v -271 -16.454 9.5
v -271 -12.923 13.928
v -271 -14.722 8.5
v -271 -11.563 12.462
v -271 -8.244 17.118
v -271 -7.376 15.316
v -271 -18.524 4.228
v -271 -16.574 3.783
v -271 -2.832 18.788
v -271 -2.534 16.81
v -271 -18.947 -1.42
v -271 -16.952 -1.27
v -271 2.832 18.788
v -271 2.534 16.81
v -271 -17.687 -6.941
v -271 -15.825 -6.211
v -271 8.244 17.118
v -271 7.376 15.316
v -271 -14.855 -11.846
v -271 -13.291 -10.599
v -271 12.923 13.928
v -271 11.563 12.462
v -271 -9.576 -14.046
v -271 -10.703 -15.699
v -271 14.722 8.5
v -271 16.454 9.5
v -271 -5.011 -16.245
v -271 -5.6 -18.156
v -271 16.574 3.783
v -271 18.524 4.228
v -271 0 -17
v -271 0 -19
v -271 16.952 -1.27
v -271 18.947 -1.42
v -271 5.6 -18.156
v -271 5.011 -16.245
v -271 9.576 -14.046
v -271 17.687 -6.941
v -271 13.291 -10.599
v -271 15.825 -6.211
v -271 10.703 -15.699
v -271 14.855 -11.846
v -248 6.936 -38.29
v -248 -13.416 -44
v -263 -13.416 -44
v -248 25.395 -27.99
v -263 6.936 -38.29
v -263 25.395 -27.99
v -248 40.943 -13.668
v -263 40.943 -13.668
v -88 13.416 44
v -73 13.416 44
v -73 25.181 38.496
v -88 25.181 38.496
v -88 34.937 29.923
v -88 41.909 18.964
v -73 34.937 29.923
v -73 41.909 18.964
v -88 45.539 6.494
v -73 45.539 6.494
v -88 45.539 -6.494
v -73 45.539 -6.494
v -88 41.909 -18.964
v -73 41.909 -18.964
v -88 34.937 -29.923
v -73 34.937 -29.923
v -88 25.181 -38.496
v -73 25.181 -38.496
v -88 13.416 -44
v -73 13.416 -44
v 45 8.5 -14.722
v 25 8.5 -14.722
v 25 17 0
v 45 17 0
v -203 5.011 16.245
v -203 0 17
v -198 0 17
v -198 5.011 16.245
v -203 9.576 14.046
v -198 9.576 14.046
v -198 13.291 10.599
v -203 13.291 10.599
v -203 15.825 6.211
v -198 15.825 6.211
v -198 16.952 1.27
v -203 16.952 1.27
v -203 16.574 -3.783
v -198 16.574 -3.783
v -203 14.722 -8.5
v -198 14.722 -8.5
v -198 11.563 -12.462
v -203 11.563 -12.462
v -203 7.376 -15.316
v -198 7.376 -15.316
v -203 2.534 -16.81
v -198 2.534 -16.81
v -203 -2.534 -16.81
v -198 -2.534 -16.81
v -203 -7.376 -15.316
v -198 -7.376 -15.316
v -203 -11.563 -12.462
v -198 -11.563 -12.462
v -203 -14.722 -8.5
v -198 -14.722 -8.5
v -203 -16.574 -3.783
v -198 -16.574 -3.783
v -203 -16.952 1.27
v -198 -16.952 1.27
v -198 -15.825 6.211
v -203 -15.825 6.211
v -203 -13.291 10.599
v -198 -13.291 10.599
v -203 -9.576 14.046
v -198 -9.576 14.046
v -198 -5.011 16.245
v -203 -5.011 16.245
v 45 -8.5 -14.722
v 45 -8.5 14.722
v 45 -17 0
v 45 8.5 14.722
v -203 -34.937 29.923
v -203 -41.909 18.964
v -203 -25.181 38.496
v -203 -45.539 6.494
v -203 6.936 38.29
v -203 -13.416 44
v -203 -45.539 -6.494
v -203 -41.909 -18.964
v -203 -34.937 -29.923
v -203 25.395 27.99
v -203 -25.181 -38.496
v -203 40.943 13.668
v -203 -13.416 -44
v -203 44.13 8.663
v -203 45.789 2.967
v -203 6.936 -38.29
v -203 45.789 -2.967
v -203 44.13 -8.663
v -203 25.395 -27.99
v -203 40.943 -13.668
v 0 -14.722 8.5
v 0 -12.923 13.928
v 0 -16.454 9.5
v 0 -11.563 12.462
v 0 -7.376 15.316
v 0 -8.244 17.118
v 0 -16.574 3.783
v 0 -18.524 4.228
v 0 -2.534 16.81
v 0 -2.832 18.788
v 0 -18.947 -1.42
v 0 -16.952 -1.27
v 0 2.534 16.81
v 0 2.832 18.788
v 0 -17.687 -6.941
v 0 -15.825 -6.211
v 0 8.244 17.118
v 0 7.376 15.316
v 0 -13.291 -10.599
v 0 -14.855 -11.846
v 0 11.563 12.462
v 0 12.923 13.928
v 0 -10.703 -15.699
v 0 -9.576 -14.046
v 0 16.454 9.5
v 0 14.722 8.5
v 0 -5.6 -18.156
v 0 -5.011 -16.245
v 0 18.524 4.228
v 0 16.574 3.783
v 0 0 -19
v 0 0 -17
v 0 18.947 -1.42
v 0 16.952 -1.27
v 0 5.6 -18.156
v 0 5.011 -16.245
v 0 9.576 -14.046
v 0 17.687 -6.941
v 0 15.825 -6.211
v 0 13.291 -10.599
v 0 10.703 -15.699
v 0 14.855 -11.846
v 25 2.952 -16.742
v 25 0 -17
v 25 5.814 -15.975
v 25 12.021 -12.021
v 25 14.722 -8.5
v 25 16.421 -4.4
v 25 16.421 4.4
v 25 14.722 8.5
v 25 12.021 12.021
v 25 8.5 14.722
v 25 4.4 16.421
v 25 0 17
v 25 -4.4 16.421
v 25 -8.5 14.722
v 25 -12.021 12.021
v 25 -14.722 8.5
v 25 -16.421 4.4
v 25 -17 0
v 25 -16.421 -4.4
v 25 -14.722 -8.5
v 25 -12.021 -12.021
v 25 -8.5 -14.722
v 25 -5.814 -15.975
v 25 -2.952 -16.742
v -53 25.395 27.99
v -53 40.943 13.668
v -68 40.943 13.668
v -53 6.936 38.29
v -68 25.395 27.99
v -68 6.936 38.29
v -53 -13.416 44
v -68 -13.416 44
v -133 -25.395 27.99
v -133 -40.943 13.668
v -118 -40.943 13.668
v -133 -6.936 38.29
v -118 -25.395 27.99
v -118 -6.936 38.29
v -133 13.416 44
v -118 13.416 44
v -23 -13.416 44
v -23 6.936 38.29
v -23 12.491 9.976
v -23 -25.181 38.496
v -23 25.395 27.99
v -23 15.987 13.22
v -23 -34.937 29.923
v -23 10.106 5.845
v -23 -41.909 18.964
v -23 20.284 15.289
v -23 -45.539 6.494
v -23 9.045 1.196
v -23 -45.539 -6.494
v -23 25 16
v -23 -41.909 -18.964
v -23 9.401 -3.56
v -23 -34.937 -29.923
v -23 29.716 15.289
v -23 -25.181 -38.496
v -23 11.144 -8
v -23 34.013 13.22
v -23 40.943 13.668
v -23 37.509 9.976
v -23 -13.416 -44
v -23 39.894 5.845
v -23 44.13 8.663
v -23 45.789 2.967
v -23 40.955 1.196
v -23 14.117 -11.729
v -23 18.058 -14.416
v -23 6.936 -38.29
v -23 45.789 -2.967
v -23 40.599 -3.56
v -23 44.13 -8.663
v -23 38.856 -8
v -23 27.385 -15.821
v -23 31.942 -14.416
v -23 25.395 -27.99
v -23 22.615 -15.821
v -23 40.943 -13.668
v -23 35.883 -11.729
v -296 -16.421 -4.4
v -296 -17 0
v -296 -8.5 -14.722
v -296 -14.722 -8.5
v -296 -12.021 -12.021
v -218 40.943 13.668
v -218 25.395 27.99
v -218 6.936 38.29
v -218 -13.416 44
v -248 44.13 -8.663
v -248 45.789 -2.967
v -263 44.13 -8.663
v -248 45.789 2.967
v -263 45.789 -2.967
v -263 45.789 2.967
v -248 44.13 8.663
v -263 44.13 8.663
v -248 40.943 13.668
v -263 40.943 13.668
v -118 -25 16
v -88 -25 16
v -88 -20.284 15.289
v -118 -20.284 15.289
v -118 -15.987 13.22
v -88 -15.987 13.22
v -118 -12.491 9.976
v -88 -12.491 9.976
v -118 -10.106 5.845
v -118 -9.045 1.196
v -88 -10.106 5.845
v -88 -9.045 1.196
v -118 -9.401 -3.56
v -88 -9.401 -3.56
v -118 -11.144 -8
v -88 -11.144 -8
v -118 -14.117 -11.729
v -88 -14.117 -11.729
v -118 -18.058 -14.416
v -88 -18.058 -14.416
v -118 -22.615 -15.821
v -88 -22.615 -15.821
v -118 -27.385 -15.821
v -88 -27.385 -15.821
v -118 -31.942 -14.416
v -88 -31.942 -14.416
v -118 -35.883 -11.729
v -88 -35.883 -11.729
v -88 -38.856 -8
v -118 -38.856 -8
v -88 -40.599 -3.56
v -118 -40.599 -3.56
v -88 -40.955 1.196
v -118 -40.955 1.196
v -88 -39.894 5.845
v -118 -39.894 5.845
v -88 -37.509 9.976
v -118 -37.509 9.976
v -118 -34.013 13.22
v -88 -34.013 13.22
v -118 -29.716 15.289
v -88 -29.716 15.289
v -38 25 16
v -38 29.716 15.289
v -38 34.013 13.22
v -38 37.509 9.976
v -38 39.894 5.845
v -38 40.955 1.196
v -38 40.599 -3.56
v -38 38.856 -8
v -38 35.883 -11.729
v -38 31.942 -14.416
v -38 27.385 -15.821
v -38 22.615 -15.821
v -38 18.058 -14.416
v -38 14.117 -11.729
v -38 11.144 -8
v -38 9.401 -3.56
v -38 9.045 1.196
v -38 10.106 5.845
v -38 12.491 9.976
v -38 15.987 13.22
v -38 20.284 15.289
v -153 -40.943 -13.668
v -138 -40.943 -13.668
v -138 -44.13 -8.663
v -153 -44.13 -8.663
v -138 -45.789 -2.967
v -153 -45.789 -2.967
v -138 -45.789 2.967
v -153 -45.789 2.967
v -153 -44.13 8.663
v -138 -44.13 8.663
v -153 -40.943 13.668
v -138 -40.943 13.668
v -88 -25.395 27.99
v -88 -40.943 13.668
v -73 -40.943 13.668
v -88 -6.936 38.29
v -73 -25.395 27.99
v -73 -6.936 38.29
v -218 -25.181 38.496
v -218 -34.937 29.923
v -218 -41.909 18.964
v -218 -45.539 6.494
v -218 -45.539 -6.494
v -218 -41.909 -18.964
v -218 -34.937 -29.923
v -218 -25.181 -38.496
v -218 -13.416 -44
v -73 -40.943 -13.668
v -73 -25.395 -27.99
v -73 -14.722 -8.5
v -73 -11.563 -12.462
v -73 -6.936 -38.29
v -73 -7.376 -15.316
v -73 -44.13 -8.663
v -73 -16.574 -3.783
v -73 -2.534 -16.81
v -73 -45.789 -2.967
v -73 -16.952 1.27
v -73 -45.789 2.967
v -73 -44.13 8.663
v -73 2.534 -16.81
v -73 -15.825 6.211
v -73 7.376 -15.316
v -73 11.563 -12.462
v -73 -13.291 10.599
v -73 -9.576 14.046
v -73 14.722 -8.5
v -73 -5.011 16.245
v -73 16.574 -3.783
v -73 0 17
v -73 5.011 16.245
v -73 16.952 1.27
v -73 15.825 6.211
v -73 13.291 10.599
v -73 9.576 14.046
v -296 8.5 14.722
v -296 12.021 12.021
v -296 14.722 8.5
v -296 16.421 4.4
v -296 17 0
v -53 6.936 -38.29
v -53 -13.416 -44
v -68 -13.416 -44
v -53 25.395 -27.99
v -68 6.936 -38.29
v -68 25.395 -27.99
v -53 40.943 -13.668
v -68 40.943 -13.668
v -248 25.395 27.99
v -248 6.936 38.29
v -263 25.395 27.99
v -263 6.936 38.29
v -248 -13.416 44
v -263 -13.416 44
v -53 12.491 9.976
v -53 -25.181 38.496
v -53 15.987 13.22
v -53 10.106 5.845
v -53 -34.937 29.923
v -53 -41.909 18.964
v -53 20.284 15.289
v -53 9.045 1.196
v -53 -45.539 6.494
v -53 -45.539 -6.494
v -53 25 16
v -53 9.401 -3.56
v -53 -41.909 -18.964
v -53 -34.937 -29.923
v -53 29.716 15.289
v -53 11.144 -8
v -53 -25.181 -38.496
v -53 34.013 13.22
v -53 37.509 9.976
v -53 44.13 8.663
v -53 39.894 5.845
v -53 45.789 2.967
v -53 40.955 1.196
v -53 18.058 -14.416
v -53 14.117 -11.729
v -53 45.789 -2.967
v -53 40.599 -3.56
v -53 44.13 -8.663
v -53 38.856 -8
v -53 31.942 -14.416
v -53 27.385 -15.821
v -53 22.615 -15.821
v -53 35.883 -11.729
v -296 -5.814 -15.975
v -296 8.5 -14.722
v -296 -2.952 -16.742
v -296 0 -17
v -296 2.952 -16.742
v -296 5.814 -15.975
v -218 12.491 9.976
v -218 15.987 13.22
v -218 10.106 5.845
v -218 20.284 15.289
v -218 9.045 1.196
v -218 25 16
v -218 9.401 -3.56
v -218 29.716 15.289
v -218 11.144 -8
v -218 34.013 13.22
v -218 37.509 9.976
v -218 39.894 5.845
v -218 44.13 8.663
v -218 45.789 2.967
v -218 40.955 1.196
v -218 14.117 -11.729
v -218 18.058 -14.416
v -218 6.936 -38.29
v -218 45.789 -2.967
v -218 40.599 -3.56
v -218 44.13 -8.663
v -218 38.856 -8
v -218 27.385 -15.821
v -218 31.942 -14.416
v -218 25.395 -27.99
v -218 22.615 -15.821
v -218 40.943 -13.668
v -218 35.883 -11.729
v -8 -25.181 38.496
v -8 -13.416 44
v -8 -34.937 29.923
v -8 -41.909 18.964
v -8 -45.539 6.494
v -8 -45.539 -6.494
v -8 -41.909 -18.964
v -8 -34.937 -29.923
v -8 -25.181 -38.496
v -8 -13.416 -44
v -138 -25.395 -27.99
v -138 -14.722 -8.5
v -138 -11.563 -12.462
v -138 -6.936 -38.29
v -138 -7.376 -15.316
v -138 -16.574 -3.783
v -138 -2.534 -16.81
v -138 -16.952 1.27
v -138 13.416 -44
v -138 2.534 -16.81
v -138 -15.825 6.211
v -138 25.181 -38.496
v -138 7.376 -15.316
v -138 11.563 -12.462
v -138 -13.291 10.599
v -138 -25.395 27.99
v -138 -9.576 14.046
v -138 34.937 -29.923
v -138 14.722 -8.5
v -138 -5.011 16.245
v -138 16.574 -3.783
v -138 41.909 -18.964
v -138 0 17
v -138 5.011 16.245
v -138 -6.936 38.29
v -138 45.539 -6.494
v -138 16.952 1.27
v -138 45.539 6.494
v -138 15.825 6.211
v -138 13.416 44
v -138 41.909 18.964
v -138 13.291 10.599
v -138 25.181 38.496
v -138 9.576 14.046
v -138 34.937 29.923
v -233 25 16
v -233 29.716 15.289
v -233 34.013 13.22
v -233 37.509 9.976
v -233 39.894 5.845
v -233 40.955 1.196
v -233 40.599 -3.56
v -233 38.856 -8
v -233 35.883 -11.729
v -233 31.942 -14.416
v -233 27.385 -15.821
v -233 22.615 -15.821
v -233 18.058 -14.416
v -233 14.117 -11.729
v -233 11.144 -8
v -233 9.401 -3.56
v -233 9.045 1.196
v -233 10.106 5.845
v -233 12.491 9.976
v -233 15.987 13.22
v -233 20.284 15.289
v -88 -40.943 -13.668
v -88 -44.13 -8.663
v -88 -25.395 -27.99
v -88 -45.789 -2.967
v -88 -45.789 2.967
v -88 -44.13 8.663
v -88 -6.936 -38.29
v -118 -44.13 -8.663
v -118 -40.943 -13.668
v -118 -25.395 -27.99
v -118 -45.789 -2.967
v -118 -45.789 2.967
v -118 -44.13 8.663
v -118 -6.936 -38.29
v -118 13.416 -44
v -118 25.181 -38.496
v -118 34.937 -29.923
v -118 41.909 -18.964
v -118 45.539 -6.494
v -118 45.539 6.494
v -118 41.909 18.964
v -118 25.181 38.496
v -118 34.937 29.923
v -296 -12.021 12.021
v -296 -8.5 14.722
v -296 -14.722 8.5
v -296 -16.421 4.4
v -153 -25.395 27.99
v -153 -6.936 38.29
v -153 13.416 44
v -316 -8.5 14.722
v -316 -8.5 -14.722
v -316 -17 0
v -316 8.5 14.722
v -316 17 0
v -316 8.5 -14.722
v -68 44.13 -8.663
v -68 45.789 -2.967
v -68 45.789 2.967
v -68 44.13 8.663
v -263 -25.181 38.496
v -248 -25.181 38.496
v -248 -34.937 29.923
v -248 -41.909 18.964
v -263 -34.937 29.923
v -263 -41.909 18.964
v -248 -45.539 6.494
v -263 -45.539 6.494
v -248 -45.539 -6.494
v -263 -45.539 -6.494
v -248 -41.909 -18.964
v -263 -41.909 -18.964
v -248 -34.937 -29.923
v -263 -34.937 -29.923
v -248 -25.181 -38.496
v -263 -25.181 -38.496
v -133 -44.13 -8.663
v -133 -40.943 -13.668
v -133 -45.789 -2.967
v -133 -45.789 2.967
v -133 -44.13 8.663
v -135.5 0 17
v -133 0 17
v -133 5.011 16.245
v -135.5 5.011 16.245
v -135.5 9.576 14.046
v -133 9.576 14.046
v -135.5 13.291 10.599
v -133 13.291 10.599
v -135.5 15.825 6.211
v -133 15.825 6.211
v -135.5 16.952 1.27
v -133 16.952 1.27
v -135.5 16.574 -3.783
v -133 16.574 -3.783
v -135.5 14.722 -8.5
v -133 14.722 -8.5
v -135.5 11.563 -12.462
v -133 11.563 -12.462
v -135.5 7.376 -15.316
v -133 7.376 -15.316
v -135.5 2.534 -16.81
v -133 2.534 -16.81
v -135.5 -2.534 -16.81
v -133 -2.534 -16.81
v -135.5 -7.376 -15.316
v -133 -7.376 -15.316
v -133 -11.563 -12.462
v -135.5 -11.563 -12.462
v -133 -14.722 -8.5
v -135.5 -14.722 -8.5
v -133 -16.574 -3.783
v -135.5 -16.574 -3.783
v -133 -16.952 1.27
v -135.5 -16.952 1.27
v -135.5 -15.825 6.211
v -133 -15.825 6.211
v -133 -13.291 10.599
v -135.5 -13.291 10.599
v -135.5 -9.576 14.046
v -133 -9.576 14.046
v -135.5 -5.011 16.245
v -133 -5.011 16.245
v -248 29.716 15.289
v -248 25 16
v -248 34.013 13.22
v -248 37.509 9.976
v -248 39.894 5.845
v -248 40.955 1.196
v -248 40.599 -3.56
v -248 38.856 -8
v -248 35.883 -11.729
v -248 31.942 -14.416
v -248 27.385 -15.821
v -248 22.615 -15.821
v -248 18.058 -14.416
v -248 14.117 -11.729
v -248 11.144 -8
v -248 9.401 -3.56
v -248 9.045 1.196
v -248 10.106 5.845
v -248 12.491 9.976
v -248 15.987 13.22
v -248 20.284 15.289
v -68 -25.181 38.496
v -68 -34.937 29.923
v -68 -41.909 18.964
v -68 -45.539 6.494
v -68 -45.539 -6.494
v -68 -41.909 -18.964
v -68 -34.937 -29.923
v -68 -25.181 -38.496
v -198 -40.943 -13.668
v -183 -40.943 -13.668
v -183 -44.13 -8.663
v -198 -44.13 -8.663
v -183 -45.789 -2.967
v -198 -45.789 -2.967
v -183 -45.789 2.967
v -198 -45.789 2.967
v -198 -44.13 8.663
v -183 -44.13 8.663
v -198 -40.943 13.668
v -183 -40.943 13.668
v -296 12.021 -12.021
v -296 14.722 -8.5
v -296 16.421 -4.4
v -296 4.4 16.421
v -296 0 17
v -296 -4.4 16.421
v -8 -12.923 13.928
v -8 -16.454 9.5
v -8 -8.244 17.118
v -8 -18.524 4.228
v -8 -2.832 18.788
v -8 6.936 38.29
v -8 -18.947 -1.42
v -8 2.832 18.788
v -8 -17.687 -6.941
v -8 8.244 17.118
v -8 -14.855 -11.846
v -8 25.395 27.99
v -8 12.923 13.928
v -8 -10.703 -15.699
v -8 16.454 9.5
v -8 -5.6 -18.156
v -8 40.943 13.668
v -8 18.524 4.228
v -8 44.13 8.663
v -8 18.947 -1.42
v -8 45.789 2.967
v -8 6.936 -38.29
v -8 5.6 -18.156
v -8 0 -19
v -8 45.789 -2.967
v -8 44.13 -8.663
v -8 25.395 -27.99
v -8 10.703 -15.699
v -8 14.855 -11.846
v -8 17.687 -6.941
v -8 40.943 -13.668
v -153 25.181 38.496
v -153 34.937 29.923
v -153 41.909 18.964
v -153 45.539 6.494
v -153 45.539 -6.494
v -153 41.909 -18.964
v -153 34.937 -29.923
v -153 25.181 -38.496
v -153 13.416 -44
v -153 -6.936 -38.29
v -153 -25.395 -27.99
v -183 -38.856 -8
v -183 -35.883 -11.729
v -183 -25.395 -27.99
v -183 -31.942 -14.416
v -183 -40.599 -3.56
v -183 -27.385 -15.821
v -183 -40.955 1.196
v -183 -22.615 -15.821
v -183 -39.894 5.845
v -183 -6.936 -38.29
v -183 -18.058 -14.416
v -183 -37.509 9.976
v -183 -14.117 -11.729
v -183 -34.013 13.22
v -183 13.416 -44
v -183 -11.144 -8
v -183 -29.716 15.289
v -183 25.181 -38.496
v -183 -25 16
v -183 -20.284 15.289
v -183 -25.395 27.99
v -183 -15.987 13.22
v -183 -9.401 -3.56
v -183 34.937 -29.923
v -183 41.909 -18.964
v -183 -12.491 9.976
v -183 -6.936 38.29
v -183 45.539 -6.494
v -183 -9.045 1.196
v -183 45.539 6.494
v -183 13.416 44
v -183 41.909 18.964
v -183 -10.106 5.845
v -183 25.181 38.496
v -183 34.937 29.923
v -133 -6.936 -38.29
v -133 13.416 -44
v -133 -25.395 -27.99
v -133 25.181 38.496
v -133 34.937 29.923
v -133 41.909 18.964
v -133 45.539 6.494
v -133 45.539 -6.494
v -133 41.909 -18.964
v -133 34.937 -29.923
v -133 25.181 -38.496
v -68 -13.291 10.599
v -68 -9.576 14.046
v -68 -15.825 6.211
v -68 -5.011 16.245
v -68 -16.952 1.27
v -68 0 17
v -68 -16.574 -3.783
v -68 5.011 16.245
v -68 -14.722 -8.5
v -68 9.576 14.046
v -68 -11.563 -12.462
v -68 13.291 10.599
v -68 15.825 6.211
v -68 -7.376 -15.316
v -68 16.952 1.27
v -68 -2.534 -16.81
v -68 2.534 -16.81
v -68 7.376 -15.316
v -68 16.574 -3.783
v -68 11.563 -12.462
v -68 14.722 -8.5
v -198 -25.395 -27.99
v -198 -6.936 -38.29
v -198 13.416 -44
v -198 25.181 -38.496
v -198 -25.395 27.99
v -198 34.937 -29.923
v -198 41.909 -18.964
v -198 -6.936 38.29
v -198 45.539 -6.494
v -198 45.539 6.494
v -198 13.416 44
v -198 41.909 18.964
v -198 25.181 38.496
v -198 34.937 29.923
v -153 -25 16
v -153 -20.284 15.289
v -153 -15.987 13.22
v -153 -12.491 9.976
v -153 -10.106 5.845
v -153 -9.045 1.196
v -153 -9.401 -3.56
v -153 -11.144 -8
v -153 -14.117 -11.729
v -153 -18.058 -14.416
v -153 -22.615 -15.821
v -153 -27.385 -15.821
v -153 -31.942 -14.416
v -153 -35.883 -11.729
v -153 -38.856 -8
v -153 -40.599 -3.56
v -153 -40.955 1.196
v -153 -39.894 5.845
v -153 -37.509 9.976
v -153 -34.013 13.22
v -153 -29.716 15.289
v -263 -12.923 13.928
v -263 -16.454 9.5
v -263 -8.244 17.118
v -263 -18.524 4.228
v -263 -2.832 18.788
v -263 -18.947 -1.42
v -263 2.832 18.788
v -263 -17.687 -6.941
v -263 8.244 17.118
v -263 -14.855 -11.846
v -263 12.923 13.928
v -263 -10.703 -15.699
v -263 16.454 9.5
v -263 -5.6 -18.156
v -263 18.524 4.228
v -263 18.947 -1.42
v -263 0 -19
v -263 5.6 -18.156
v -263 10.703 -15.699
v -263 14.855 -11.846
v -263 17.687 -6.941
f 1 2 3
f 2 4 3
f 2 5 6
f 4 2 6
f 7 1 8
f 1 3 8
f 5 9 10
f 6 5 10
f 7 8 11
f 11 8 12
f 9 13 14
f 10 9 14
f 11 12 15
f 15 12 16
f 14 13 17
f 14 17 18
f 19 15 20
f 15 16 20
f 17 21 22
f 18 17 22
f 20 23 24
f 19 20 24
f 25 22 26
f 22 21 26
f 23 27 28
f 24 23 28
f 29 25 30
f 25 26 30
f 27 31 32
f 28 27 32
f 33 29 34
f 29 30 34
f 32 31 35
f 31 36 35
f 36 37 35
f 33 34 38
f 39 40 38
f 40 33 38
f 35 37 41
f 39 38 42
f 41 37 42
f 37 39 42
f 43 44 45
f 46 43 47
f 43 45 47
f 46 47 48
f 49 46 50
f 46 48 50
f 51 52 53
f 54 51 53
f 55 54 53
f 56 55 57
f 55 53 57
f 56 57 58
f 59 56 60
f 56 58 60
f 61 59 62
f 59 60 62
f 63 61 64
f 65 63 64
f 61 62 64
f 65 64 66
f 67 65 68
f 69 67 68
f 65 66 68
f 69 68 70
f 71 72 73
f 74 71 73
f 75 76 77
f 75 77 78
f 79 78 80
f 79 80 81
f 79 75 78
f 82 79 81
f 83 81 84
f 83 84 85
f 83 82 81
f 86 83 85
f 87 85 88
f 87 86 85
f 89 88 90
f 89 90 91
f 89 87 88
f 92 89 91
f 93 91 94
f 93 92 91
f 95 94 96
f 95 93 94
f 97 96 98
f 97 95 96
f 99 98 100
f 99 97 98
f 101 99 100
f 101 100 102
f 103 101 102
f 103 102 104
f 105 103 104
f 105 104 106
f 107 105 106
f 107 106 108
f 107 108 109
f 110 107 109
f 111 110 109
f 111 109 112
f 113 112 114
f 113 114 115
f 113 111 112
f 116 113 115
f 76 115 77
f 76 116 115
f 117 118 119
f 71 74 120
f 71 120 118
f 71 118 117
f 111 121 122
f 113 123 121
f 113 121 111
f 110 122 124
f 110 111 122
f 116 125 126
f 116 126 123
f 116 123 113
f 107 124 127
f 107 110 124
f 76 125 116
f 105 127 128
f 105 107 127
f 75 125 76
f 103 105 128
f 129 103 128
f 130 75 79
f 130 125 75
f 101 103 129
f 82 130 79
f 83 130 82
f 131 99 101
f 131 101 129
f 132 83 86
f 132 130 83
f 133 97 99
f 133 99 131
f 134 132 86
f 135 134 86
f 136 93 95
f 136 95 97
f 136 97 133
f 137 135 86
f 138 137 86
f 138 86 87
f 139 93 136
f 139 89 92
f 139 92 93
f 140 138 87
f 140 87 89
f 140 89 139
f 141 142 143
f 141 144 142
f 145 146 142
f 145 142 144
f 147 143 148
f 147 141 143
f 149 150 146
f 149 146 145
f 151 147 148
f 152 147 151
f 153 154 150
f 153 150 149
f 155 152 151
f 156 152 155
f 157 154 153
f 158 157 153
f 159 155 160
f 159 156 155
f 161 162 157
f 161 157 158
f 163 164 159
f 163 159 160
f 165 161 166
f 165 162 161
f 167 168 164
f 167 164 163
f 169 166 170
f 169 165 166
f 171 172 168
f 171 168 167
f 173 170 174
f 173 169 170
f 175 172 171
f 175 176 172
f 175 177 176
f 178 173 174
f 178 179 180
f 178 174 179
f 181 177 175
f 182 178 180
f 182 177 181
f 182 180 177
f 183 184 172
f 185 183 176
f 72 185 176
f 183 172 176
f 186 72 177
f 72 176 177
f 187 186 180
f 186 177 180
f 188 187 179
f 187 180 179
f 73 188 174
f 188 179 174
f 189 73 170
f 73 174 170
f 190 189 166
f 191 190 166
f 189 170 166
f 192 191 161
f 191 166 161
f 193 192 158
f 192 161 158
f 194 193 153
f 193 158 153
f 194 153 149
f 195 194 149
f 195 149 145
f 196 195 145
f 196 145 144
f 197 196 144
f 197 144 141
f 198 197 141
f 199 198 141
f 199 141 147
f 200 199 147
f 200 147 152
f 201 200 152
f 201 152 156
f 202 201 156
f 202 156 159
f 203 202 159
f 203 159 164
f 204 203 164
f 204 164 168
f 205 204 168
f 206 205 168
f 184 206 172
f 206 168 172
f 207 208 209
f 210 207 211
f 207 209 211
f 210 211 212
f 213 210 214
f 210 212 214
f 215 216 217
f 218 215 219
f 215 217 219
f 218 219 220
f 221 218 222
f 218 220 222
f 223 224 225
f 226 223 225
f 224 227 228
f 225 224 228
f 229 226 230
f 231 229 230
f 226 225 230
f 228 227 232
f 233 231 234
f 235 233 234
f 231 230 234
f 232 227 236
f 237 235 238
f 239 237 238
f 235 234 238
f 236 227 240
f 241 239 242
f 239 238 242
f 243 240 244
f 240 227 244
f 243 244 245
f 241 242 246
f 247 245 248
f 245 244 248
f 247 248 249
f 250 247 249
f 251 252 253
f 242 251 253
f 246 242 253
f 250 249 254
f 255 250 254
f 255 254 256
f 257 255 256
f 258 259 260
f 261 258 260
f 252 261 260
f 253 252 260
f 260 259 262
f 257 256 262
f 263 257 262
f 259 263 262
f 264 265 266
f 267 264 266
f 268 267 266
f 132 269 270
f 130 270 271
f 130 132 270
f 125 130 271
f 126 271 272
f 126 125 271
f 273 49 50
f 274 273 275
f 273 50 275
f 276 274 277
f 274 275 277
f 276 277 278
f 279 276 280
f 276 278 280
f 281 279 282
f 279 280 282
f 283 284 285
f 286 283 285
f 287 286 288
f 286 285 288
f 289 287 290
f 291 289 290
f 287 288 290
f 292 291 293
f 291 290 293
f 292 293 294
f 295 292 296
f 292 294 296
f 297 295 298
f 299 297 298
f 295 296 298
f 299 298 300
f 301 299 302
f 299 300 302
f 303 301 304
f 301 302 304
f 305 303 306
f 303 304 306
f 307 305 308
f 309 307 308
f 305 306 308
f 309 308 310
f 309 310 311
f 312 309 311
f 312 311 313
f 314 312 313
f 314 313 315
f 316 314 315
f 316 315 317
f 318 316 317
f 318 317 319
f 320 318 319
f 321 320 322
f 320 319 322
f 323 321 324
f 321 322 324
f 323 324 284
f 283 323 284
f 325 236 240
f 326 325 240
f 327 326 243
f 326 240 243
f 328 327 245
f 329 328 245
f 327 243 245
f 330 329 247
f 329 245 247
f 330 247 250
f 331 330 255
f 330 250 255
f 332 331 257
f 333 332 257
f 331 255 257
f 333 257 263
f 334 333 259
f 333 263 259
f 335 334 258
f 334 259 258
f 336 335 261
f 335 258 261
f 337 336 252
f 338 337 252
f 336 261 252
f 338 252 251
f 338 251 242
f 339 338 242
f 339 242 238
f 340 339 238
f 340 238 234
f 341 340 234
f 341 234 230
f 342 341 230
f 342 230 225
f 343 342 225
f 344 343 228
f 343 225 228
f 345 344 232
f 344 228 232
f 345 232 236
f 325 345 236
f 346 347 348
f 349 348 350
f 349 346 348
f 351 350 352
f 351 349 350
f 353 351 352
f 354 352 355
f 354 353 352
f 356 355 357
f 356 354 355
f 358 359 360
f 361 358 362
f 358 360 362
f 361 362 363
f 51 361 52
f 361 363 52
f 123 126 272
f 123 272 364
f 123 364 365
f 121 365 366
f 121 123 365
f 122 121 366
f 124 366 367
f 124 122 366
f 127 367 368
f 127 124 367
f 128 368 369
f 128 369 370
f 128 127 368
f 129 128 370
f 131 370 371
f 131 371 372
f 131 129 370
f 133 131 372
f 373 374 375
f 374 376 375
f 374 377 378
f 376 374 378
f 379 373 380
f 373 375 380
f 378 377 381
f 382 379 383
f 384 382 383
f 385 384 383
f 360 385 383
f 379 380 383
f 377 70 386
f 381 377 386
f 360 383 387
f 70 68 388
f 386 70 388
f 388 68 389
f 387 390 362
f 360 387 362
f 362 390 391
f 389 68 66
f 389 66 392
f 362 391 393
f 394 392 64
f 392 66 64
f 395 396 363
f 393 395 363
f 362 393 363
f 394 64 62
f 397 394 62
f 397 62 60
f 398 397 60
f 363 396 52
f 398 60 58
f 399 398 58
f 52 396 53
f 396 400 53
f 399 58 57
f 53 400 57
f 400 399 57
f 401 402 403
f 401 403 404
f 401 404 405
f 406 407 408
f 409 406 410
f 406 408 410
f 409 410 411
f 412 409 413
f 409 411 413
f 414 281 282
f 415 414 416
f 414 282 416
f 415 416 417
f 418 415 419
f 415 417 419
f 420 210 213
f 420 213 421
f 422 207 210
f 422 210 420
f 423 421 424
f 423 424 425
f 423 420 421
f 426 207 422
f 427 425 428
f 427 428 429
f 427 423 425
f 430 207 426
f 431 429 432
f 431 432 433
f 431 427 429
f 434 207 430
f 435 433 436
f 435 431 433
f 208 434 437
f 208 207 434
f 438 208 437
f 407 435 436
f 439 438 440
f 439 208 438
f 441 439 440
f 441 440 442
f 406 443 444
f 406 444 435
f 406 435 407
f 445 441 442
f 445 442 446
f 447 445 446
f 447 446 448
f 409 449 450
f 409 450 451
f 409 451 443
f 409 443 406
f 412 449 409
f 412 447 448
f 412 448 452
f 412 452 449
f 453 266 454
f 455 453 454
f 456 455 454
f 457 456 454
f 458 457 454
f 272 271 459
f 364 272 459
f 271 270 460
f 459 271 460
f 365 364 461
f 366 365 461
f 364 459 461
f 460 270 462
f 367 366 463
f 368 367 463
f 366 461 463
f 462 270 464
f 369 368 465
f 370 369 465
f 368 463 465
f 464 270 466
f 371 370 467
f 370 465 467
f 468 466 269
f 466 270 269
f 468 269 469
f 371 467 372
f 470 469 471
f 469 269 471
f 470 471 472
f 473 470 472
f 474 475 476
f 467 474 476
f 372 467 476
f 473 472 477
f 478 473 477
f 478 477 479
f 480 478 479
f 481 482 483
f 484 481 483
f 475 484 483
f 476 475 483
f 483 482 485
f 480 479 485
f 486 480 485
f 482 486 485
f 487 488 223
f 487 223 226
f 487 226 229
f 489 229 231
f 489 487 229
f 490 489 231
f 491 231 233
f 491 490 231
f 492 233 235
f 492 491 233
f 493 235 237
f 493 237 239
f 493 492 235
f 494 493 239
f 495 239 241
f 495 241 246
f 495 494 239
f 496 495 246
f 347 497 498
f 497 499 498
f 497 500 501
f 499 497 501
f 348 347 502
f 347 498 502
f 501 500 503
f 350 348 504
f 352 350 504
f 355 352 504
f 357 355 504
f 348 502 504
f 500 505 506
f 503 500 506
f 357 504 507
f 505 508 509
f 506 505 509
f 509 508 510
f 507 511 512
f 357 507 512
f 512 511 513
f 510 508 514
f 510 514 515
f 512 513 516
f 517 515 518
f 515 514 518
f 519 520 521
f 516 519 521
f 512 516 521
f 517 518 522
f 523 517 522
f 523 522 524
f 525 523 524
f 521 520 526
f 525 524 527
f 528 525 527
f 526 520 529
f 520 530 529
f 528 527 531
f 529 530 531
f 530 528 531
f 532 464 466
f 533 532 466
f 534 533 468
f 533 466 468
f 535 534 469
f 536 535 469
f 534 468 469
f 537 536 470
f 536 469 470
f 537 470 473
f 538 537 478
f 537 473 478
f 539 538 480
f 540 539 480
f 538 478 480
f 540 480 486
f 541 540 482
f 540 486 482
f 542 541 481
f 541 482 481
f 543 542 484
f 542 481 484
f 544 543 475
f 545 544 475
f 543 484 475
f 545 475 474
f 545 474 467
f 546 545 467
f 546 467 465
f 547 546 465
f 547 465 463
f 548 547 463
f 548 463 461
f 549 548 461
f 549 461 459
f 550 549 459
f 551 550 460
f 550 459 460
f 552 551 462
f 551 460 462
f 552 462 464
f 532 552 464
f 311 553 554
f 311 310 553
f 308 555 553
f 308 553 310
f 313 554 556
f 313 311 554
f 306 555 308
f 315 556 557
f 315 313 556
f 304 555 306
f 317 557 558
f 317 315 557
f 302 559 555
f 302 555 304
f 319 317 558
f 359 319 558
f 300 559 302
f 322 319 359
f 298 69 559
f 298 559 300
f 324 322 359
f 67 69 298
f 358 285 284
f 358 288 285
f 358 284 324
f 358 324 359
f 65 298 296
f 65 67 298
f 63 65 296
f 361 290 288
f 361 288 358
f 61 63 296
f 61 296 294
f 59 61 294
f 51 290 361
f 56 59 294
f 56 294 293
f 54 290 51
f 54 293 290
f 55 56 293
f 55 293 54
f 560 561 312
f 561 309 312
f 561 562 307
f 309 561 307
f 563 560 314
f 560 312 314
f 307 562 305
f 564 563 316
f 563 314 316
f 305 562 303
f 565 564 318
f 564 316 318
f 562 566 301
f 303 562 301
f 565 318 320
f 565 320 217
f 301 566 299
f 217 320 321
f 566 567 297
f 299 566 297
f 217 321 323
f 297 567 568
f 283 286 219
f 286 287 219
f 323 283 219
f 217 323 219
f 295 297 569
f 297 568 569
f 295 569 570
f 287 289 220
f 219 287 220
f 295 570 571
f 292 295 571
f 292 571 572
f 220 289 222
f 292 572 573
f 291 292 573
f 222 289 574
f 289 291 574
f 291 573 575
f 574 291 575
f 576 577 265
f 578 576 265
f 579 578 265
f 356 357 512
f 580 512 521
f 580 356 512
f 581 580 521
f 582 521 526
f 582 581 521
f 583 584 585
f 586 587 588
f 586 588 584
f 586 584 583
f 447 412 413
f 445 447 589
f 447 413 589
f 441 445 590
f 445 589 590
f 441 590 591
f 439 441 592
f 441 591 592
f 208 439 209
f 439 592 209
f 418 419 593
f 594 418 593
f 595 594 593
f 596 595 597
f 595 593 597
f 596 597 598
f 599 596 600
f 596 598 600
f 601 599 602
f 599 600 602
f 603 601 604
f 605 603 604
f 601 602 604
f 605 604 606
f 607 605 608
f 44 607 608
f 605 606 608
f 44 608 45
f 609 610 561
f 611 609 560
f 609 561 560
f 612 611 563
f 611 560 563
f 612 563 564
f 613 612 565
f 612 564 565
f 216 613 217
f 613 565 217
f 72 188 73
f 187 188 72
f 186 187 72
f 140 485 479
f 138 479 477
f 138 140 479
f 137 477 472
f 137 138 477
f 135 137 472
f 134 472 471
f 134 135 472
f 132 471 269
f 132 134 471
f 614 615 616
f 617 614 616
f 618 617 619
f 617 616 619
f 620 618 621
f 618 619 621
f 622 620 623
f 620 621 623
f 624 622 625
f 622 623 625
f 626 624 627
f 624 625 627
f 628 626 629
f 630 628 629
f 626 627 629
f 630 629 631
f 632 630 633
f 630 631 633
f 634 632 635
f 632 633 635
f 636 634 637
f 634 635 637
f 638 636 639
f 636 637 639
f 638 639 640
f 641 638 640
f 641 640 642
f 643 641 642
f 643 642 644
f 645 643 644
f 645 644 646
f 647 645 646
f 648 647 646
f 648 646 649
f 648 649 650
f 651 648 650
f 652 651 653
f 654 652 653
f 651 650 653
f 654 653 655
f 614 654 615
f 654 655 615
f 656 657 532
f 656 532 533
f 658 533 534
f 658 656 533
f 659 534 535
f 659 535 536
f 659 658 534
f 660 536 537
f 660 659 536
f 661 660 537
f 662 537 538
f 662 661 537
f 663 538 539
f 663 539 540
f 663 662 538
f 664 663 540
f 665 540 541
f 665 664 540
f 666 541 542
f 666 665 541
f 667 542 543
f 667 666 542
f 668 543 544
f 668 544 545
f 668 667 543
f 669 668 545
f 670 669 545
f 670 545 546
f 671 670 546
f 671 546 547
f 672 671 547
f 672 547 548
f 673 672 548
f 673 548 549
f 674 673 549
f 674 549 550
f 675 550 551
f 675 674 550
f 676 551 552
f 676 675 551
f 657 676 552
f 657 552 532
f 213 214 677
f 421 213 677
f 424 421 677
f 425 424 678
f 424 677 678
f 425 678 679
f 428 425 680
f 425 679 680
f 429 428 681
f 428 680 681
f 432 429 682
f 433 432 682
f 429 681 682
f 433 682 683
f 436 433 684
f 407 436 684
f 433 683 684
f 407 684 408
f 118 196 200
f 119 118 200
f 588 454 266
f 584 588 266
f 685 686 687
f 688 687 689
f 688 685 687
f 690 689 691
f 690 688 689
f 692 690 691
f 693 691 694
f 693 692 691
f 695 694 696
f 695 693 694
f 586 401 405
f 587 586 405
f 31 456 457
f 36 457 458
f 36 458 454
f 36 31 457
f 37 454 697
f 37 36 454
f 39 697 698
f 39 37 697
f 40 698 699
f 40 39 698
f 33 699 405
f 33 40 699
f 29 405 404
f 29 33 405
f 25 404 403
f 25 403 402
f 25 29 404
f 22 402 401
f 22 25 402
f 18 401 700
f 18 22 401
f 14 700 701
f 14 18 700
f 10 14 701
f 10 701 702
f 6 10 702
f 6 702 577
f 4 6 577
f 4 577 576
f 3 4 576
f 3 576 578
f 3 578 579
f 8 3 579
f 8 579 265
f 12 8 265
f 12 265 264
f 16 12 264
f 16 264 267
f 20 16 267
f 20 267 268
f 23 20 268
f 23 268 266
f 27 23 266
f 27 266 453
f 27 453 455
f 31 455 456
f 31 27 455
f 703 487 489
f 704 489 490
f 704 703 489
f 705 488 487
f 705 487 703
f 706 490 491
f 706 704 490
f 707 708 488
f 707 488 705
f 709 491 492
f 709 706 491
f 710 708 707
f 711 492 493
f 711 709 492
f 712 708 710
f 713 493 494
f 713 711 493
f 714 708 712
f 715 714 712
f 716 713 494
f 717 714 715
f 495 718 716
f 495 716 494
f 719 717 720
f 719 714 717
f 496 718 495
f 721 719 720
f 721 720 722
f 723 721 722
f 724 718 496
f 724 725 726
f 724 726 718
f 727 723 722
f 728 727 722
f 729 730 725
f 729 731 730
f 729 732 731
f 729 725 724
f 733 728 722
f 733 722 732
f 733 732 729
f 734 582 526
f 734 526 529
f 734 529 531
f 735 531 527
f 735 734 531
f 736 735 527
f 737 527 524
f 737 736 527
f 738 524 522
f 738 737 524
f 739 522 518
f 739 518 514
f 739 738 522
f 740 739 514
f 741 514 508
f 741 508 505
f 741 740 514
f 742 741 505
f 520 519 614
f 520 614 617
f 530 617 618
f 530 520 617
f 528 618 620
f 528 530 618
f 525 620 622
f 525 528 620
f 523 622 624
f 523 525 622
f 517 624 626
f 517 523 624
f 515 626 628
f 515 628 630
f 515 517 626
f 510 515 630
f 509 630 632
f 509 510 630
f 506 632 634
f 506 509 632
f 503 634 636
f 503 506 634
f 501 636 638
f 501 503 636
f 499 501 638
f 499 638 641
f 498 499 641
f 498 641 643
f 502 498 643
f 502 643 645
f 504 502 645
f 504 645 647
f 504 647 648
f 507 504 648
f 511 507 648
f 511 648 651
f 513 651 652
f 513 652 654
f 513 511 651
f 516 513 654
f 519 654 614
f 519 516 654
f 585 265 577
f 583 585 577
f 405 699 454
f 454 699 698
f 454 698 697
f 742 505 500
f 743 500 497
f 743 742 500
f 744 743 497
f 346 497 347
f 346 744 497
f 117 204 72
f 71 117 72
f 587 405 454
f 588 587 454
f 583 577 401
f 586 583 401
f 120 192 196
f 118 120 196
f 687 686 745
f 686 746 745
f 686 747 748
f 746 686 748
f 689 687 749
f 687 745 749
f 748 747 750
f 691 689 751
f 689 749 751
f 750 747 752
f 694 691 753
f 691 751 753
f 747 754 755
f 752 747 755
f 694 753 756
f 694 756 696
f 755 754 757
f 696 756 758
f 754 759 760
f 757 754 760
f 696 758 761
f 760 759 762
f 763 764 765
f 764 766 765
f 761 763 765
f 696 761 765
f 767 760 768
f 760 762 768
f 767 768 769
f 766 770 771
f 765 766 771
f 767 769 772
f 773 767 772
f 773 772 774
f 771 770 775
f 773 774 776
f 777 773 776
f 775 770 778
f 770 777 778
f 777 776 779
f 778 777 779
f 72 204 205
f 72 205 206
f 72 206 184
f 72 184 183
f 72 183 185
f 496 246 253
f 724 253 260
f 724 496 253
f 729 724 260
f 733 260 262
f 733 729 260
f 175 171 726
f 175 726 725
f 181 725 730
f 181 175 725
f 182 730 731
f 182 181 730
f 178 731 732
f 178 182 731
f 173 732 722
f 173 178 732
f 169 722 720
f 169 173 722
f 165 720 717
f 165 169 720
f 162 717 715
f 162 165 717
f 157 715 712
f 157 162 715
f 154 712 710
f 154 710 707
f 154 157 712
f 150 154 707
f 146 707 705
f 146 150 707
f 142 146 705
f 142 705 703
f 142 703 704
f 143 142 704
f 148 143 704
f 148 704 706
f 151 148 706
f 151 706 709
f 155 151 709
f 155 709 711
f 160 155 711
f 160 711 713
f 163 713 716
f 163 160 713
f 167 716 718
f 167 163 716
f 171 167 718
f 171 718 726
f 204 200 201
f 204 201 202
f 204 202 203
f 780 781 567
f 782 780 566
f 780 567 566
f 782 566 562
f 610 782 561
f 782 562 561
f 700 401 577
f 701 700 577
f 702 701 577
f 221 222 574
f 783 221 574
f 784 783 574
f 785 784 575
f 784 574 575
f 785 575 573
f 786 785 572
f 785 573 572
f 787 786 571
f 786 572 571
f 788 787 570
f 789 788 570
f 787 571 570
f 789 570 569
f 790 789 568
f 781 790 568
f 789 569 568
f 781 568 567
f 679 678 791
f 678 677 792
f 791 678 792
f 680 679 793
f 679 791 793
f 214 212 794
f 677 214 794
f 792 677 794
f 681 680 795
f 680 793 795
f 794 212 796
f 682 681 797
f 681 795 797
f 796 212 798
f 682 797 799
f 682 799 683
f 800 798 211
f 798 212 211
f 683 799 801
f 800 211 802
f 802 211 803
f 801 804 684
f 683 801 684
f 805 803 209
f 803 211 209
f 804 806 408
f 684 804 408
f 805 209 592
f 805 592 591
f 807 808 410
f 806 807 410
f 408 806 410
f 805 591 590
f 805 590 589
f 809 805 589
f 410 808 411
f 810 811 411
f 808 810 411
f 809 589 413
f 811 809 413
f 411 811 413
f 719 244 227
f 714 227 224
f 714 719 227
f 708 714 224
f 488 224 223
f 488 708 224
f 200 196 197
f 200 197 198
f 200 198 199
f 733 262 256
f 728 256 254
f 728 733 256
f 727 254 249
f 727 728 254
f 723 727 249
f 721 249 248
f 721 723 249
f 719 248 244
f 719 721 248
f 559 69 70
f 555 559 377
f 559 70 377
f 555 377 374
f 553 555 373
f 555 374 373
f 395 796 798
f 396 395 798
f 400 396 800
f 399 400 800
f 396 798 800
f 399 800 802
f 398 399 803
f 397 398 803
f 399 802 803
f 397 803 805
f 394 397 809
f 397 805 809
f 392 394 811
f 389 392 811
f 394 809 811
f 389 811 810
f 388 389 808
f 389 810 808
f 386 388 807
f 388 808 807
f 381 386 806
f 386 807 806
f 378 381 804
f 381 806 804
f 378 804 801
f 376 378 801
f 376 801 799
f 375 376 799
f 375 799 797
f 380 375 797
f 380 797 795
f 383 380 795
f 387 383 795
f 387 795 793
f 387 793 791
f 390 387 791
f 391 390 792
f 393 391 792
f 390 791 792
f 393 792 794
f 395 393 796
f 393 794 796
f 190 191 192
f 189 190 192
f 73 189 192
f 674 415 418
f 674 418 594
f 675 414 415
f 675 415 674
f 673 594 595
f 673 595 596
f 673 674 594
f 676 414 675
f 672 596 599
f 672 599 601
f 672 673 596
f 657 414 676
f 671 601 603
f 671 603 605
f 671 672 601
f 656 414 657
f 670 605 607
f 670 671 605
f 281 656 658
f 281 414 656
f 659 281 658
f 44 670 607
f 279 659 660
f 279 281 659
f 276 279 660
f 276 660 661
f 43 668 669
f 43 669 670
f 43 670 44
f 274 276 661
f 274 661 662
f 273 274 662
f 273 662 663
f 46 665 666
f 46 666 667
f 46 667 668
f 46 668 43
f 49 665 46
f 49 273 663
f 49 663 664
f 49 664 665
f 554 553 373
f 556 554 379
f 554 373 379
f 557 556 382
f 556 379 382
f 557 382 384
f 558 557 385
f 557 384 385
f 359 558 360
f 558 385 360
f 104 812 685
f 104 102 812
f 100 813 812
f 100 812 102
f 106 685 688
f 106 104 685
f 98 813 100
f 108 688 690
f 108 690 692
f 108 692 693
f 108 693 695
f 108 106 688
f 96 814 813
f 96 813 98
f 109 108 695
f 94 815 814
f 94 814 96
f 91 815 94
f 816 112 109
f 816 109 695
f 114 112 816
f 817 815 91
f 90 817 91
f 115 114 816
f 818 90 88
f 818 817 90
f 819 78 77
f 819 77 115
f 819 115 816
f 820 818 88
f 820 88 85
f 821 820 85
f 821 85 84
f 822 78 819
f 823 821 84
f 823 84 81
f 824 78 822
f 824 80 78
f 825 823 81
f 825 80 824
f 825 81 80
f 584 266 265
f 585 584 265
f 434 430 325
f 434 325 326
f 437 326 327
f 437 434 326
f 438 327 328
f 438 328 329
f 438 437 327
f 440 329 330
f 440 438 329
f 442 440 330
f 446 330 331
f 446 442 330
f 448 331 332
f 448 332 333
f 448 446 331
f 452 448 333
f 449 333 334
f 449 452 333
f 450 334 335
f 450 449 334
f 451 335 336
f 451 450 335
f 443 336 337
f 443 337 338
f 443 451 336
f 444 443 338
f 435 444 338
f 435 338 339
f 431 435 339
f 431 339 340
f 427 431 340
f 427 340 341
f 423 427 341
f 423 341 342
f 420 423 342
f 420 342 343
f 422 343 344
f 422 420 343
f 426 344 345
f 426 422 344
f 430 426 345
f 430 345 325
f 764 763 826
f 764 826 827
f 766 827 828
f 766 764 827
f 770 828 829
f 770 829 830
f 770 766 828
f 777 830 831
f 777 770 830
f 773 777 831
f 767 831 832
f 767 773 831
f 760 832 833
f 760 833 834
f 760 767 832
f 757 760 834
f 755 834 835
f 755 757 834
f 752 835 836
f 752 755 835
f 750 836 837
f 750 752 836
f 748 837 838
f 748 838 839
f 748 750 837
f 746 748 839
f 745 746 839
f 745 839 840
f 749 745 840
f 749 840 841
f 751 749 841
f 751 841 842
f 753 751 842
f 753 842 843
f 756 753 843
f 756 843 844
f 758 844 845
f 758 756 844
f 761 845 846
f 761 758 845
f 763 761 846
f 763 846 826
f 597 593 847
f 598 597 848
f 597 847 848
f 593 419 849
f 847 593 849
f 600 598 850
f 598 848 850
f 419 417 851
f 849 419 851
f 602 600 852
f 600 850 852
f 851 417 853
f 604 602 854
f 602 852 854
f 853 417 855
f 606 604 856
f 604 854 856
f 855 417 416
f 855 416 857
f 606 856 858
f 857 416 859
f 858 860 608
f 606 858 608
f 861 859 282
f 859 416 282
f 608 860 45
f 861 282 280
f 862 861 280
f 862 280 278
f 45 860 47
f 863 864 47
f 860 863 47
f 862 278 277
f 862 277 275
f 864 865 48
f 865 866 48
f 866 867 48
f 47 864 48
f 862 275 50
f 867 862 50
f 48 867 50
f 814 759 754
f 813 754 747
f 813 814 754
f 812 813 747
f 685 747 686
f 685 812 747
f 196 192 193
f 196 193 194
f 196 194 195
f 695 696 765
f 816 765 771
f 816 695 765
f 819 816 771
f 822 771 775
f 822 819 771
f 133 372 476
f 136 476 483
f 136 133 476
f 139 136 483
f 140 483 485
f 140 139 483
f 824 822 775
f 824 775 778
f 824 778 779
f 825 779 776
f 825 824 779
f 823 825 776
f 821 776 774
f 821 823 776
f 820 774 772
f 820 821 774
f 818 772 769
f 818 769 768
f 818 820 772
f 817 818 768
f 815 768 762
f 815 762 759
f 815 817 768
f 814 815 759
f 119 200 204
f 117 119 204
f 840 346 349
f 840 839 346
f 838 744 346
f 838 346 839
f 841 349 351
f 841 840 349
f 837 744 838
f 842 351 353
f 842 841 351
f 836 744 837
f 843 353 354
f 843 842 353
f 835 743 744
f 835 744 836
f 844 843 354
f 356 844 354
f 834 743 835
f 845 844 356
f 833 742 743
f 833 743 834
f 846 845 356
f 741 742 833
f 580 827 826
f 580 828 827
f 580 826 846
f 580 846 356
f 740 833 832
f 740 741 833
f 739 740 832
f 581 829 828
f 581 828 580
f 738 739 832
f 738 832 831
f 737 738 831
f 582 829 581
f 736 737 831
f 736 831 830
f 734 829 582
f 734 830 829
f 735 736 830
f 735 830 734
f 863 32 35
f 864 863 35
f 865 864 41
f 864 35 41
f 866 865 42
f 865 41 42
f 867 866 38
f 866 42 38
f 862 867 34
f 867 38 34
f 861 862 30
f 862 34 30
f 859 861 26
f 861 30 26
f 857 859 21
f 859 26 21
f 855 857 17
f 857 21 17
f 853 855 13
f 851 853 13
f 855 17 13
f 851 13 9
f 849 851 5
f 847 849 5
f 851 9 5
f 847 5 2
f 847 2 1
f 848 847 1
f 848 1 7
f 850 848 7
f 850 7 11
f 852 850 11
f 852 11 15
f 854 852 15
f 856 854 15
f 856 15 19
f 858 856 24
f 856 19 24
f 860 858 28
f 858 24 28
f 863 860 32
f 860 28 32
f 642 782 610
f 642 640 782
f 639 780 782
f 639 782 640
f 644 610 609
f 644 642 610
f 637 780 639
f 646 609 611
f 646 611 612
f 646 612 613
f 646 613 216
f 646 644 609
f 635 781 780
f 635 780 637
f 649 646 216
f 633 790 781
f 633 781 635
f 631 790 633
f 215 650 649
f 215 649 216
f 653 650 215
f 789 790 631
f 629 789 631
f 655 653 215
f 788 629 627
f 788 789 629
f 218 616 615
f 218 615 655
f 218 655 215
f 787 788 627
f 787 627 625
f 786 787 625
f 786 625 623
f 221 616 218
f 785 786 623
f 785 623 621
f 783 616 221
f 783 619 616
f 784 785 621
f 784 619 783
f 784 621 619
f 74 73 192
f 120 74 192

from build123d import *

# Parameters (mm, degrees)
SKETCH1_R            = 17
BOSS_EXTRUDE1_DEPTH  = 25
SKETCH1_3_R          = 19
BOSS_EXTRUDE2_DEPTH  = 8
BOSS_EXTRUDE3_DEPTH  = 15
SKETCH5_R            = 16
BOSS_EXTRUDE4_DEPTH  = 15
BOSS_EXTRUDE5_START  = 5
SKETCH6_R            = 17
BOSS_EXTRUDE5_DEPTH  = 5
BOSS_EXTRUDE6_DEPTH  = 15
SKETCH8_R            = 16
BOSS_EXTRUDE7_DEPTH  = 30
BOSS_EXTRUDE8_DEPTH  = 15
BOSS_EXTRUDE9_START  = 2.5
SKETCH10_R           = 17
BOSS_EXTRUDE9_DEPTH  = 2.5
BOSS_EXTRUDE10_DEPTH = 20
BOSS_EXTRUDE11_DEPTH = 20


with BuildPart() as part:
    # Sketch1 → Boss-Extrude1 (new body)
    with BuildSketch(Plane(origin=(0, 0, 0), x_dir=(0, 0, -1), z_dir=(1, 0, 0))):
        Circle(SKETCH1_R)
    extrude(amount=BOSS_EXTRUDE1_DEPTH)

    # Sketch1<3> → Boss-Extrude2 (add)
    with BuildSketch(Plane(origin=(0, 0, 0), x_dir=(0, 0, -1), z_dir=(1, 0, 0))):
        Circle(SKETCH1_3_R)
    extrude(amount=-BOSS_EXTRUDE2_DEPTH)

    # Sketch4 → Boss-Extrude3 (add)
    with BuildSketch(Plane.ZY.offset(8)):
        with BuildLine():
            ThreePointArc((-13.668094758, 40.943123461), (0, 46), (13.668094758, 40.943123461))
            ThreePointArc((13.668094758, 40.943123461), (33.683444249, 16.469257624), (44, -13.416407865))
            ThreePointArc((44, -13.416407865), (0, -46), (-44, -13.416407865))
            ThreePointArc((-44, -13.416407865), (-33.683444249, 16.469257624), (-13.668094758, 40.943123461))
        make_face()
    boss_extrude3 = extrude(amount=BOSS_EXTRUDE3_DEPTH)

    # Sketch5 → Boss-Extrude4 (add)
    with BuildSketch(Plane.ZY.offset(23)):
        with Locations((0, 25)):
            Circle(SKETCH5_R)
    boss_extrude4 = extrude(amount=BOSS_EXTRUDE4_DEPTH)

    # Mirror1: Boss-Extrude3, Boss-Extrude4 across plane
    add(boss_extrude3.mirror(Plane(origin=(-38, 25, 0), x_dir=(0, 0, 1), z_dir=(-1, 0, 0))))
    add(boss_extrude4.mirror(Plane(origin=(-38, 25, 0), x_dir=(0, 0, 1), z_dir=(-1, 0, 0))))

    # Sketch6 → Boss-Extrude5 (add)
    with BuildSketch(Plane.ZY.offset(68).offset(BOSS_EXTRUDE5_START)):
        Circle(SKETCH6_R)
    extrude(amount=-BOSS_EXTRUDE5_DEPTH)

    # Sketch7 → Boss-Extrude6 (add)
    with BuildSketch(Plane.ZY.offset(73)):
        with BuildLine():
            ThreePointArc((-13.668094758, -40.943123461), (0, -46), (13.668094758, -40.943123461))
            ThreePointArc((13.668094758, -40.943123461), (33.683444249, -16.469257624), (44, 13.416407865))
            ThreePointArc((44, 13.416407865), (0, 46), (-44, 13.416407865))
            ThreePointArc((-44, 13.416407865), (-33.683444249, -16.469257624), (-13.668094758, -40.943123461))
        make_face()
    extrude(amount=BOSS_EXTRUDE6_DEPTH)

    # Sketch8 → Boss-Extrude7 (add)
    with BuildSketch(Plane.ZY.offset(88)):
        with Locations((0, -25)):
            Circle(SKETCH8_R)
    extrude(amount=BOSS_EXTRUDE7_DEPTH)

    # Sketch9 → Boss-Extrude8 (add)
    with BuildSketch(Plane.ZY.offset(118)):
        with BuildLine():
            ThreePointArc((-13.668094758, -40.943123461), (0, -46), (13.668094758, -40.943123461))
            ThreePointArc((13.668094758, -40.943123461), (33.683444249, -16.469257624), (44, 13.416407865))
            ThreePointArc((44, 13.416407865), (0, 46), (-44, 13.416407865))
            ThreePointArc((-44, 13.416407865), (-33.683444249, -16.469257624), (-13.668094758, -40.943123461))
        make_face()
    extrude(amount=BOSS_EXTRUDE8_DEPTH)

    # Sketch10 → Boss-Extrude9 (add)
    with BuildSketch(Plane.ZY.offset(133).offset(BOSS_EXTRUDE9_START)):
        Circle(SKETCH10_R)
    extrude(amount=-BOSS_EXTRUDE9_DEPTH)

    # Mirror2: part across plane


with BuildPart() as part_1:
    add(part.part)
    add(part.part.mirror(Plane.ZY.offset(135.5)))

    # Sketch11 → Boss-Extrude10 (add)
    with BuildSketch(Plane(origin=(25, 0, 0), x_dir=(0, 0, -1), z_dir=(1, 0, 0))):
        Polygon((14.722431864, -8.5), (14.722431864, 8.5), (0, 17), (-14.722431864, 8.5), (-14.722431864, -8.5), (0, -17), align=None)
    extrude(amount=BOSS_EXTRUDE10_DEPTH)

    # Sketch12 → Boss-Extrude11 (add)
    with BuildSketch(Plane.ZY.offset(296)):
        Polygon((-14.722431864, 8.5), (-14.722431864, -8.5), (0, -17), (14.722431864, -8.5), (14.722431864, 8.5), (0, 17), align=None)
    extrude(amount=BOSS_EXTRUDE11_DEPTH)


solid = part_1.part
